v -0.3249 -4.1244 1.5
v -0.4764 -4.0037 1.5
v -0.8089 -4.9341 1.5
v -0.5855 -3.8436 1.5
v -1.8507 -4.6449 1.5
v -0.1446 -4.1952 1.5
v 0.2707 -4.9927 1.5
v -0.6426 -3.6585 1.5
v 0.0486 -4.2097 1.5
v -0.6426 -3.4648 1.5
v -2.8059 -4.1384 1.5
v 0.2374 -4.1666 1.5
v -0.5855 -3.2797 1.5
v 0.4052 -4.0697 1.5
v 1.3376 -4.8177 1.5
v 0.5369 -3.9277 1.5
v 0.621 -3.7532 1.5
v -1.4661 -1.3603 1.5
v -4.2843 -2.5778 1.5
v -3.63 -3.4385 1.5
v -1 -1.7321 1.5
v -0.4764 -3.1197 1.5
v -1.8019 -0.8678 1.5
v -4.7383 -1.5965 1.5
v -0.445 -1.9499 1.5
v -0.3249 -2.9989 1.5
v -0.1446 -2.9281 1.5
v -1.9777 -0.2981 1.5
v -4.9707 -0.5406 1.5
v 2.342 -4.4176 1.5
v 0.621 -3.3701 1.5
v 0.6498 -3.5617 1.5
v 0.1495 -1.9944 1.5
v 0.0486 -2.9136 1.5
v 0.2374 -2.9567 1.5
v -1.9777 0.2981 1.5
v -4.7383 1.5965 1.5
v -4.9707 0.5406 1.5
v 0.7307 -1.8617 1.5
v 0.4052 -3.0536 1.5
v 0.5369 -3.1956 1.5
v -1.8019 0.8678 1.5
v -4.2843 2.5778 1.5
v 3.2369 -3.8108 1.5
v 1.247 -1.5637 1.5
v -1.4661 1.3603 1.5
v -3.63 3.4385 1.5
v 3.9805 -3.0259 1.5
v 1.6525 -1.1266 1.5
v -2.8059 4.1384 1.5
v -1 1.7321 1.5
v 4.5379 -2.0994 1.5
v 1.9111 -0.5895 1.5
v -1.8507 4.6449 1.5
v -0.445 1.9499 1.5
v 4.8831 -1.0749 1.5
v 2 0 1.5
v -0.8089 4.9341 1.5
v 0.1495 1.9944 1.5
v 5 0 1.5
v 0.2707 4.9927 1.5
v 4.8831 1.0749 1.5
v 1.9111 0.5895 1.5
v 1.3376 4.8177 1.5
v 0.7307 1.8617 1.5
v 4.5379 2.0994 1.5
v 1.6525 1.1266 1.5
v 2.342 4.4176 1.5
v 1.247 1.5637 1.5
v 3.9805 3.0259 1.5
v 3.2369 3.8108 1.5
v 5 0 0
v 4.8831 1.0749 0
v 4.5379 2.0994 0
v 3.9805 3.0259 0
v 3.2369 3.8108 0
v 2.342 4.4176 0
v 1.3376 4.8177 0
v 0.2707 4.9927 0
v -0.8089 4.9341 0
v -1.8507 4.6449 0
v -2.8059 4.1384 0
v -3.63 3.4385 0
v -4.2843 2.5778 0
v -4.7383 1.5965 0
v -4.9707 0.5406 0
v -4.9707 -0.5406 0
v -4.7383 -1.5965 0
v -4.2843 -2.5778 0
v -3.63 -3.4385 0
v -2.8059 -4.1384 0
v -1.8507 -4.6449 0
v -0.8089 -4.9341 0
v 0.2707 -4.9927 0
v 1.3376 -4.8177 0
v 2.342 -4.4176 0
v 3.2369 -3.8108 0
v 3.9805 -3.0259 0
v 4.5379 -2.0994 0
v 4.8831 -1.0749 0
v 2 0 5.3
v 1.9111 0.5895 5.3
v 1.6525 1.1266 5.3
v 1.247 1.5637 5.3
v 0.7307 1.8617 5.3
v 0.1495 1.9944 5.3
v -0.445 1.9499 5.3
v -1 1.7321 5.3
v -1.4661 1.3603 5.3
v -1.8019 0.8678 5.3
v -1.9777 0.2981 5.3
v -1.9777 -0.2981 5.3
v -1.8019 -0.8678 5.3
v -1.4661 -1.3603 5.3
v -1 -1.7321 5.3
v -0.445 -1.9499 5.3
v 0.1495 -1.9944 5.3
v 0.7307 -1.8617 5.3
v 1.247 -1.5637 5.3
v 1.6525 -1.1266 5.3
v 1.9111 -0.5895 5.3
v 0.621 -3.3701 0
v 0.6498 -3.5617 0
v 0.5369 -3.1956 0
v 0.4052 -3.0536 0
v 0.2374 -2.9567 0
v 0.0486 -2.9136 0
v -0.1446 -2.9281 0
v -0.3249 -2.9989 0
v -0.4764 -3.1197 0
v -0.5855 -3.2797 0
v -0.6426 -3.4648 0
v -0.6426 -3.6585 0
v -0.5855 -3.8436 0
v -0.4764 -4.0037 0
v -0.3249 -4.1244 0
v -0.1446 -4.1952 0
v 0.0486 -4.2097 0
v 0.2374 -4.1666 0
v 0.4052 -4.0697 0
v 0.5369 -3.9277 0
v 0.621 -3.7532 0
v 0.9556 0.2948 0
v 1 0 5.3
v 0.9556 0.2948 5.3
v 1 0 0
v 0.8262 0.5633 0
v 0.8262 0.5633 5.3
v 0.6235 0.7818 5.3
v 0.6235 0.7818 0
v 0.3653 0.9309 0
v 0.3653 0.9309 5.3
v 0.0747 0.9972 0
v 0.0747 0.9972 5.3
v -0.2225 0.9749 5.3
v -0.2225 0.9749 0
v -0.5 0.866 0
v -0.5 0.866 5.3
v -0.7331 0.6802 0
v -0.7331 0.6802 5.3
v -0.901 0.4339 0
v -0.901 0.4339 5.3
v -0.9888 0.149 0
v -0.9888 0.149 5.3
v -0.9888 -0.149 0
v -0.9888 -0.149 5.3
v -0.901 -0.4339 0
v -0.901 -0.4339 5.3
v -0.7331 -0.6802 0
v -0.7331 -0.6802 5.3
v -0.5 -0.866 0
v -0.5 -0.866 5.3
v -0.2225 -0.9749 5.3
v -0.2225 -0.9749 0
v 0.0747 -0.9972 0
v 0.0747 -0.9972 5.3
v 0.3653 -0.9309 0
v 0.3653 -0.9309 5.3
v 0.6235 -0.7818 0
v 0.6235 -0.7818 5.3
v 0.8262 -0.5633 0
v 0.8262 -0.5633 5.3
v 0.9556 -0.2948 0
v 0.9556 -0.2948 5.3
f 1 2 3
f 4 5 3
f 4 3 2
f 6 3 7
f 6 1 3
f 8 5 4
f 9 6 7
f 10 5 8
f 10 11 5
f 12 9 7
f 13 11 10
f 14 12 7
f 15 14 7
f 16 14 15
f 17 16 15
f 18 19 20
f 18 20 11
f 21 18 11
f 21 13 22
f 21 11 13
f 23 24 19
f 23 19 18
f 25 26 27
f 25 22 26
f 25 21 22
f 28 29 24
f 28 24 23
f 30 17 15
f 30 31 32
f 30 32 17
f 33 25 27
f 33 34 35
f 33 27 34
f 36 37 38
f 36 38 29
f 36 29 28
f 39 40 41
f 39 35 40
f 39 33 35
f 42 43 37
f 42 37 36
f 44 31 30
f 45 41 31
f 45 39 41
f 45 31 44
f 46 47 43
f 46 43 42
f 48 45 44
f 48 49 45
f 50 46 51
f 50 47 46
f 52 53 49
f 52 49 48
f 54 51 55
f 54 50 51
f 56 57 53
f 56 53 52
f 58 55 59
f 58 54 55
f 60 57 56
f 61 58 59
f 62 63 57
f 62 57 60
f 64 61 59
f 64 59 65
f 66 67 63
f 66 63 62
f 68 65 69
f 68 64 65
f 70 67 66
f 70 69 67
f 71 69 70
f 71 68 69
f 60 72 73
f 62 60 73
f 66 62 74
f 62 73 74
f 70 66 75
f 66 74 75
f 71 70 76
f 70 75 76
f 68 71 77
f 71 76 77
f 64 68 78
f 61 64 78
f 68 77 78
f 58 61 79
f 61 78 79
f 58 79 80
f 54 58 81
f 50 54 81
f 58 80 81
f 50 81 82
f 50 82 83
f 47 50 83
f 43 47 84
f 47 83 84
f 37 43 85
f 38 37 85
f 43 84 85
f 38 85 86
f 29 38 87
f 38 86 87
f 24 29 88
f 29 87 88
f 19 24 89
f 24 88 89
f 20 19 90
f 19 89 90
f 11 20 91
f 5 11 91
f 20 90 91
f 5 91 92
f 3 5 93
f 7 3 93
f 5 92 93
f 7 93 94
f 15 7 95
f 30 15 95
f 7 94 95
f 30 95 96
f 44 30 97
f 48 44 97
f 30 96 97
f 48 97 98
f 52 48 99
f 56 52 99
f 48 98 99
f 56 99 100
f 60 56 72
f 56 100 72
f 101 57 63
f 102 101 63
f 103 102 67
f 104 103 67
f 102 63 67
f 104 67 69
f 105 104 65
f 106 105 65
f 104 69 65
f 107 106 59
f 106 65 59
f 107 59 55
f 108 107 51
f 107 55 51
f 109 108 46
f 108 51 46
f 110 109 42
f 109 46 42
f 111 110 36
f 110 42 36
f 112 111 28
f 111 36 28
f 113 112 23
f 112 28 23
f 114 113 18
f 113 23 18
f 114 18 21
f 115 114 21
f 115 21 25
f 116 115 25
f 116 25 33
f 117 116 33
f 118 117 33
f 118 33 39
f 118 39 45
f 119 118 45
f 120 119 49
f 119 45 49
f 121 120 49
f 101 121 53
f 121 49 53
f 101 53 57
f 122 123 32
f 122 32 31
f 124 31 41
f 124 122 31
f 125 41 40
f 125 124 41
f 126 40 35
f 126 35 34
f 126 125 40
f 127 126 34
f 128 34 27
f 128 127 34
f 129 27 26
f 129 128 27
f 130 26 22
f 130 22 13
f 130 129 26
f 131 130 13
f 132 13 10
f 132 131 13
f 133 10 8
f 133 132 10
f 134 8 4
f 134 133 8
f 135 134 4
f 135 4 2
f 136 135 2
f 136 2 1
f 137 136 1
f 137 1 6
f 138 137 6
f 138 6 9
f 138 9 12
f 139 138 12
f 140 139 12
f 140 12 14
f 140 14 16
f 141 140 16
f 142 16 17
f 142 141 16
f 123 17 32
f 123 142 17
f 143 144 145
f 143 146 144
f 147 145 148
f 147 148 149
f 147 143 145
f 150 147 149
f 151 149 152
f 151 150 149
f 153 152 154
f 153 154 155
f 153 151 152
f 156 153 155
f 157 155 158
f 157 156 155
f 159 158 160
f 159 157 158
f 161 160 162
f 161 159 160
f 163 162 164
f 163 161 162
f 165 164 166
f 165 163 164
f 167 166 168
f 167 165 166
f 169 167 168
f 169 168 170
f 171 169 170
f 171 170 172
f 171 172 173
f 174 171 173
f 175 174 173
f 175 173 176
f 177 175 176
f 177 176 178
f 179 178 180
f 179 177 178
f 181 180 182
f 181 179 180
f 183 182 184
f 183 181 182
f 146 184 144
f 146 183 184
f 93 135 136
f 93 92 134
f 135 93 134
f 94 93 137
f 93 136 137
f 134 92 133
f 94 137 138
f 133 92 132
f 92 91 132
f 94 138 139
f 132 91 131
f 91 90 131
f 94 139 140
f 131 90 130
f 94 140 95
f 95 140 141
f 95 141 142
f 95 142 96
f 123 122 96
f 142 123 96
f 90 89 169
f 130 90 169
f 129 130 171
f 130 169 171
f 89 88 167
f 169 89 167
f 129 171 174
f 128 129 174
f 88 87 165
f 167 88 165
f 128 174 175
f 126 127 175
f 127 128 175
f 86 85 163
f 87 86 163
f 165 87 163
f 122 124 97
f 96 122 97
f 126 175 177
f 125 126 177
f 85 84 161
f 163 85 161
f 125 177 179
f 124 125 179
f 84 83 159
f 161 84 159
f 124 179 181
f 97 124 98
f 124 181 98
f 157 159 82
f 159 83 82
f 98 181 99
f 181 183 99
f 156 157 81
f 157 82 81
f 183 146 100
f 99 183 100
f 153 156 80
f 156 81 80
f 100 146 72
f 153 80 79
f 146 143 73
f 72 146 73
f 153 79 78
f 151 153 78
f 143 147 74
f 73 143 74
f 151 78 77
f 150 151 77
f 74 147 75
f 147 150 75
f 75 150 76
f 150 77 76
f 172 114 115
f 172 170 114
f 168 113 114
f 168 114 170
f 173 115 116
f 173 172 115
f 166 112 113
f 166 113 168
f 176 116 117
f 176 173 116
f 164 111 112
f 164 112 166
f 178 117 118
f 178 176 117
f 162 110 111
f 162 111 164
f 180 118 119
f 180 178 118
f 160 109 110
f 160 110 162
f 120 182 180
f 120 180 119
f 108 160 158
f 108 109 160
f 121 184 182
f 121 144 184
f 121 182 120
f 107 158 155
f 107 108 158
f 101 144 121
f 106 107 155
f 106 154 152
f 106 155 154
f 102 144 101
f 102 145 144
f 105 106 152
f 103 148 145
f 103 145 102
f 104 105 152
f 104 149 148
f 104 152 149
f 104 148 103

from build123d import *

# Parameters (mm, degrees)
F0_R     = 5
F0_R_2   = 1
F1_DEPTH = 1.5
F2_R     = 2
F2_R_2   = 1
F3_DEPTH = 3.8
F4_R     = 0.6498381819
F5_DEPTH = 1.5


# Not quite as in the source:
# - a feature names something its author has since deleted; it is built from what else it names


with BuildPart() as f1:
    # F0 (on Top) → F1 (new body)
    with BuildSketch(Plane.XY):
        Circle(F0_R)
        Circle(F0_R_2, mode=Mode.SUBTRACT)
    extrude(amount=F1_DEPTH)

    # F2 (on face) → F3 (join)
    with BuildSketch(Plane.XY.offset(1.5)):
        Circle(F2_R)
        Circle(F2_R_2, mode=Mode.SUBTRACT)
    extrude(amount=F3_DEPTH)

    # F4 (on Top) → F5 (cut, through all)
    with BuildSketch(Plane.XY):
        with Locations((0, -3.5616646055)):
            Circle(F4_R)
    extrude(amount=F5_DEPTH, mode=Mode.SUBTRACT)


solid = f1.part
